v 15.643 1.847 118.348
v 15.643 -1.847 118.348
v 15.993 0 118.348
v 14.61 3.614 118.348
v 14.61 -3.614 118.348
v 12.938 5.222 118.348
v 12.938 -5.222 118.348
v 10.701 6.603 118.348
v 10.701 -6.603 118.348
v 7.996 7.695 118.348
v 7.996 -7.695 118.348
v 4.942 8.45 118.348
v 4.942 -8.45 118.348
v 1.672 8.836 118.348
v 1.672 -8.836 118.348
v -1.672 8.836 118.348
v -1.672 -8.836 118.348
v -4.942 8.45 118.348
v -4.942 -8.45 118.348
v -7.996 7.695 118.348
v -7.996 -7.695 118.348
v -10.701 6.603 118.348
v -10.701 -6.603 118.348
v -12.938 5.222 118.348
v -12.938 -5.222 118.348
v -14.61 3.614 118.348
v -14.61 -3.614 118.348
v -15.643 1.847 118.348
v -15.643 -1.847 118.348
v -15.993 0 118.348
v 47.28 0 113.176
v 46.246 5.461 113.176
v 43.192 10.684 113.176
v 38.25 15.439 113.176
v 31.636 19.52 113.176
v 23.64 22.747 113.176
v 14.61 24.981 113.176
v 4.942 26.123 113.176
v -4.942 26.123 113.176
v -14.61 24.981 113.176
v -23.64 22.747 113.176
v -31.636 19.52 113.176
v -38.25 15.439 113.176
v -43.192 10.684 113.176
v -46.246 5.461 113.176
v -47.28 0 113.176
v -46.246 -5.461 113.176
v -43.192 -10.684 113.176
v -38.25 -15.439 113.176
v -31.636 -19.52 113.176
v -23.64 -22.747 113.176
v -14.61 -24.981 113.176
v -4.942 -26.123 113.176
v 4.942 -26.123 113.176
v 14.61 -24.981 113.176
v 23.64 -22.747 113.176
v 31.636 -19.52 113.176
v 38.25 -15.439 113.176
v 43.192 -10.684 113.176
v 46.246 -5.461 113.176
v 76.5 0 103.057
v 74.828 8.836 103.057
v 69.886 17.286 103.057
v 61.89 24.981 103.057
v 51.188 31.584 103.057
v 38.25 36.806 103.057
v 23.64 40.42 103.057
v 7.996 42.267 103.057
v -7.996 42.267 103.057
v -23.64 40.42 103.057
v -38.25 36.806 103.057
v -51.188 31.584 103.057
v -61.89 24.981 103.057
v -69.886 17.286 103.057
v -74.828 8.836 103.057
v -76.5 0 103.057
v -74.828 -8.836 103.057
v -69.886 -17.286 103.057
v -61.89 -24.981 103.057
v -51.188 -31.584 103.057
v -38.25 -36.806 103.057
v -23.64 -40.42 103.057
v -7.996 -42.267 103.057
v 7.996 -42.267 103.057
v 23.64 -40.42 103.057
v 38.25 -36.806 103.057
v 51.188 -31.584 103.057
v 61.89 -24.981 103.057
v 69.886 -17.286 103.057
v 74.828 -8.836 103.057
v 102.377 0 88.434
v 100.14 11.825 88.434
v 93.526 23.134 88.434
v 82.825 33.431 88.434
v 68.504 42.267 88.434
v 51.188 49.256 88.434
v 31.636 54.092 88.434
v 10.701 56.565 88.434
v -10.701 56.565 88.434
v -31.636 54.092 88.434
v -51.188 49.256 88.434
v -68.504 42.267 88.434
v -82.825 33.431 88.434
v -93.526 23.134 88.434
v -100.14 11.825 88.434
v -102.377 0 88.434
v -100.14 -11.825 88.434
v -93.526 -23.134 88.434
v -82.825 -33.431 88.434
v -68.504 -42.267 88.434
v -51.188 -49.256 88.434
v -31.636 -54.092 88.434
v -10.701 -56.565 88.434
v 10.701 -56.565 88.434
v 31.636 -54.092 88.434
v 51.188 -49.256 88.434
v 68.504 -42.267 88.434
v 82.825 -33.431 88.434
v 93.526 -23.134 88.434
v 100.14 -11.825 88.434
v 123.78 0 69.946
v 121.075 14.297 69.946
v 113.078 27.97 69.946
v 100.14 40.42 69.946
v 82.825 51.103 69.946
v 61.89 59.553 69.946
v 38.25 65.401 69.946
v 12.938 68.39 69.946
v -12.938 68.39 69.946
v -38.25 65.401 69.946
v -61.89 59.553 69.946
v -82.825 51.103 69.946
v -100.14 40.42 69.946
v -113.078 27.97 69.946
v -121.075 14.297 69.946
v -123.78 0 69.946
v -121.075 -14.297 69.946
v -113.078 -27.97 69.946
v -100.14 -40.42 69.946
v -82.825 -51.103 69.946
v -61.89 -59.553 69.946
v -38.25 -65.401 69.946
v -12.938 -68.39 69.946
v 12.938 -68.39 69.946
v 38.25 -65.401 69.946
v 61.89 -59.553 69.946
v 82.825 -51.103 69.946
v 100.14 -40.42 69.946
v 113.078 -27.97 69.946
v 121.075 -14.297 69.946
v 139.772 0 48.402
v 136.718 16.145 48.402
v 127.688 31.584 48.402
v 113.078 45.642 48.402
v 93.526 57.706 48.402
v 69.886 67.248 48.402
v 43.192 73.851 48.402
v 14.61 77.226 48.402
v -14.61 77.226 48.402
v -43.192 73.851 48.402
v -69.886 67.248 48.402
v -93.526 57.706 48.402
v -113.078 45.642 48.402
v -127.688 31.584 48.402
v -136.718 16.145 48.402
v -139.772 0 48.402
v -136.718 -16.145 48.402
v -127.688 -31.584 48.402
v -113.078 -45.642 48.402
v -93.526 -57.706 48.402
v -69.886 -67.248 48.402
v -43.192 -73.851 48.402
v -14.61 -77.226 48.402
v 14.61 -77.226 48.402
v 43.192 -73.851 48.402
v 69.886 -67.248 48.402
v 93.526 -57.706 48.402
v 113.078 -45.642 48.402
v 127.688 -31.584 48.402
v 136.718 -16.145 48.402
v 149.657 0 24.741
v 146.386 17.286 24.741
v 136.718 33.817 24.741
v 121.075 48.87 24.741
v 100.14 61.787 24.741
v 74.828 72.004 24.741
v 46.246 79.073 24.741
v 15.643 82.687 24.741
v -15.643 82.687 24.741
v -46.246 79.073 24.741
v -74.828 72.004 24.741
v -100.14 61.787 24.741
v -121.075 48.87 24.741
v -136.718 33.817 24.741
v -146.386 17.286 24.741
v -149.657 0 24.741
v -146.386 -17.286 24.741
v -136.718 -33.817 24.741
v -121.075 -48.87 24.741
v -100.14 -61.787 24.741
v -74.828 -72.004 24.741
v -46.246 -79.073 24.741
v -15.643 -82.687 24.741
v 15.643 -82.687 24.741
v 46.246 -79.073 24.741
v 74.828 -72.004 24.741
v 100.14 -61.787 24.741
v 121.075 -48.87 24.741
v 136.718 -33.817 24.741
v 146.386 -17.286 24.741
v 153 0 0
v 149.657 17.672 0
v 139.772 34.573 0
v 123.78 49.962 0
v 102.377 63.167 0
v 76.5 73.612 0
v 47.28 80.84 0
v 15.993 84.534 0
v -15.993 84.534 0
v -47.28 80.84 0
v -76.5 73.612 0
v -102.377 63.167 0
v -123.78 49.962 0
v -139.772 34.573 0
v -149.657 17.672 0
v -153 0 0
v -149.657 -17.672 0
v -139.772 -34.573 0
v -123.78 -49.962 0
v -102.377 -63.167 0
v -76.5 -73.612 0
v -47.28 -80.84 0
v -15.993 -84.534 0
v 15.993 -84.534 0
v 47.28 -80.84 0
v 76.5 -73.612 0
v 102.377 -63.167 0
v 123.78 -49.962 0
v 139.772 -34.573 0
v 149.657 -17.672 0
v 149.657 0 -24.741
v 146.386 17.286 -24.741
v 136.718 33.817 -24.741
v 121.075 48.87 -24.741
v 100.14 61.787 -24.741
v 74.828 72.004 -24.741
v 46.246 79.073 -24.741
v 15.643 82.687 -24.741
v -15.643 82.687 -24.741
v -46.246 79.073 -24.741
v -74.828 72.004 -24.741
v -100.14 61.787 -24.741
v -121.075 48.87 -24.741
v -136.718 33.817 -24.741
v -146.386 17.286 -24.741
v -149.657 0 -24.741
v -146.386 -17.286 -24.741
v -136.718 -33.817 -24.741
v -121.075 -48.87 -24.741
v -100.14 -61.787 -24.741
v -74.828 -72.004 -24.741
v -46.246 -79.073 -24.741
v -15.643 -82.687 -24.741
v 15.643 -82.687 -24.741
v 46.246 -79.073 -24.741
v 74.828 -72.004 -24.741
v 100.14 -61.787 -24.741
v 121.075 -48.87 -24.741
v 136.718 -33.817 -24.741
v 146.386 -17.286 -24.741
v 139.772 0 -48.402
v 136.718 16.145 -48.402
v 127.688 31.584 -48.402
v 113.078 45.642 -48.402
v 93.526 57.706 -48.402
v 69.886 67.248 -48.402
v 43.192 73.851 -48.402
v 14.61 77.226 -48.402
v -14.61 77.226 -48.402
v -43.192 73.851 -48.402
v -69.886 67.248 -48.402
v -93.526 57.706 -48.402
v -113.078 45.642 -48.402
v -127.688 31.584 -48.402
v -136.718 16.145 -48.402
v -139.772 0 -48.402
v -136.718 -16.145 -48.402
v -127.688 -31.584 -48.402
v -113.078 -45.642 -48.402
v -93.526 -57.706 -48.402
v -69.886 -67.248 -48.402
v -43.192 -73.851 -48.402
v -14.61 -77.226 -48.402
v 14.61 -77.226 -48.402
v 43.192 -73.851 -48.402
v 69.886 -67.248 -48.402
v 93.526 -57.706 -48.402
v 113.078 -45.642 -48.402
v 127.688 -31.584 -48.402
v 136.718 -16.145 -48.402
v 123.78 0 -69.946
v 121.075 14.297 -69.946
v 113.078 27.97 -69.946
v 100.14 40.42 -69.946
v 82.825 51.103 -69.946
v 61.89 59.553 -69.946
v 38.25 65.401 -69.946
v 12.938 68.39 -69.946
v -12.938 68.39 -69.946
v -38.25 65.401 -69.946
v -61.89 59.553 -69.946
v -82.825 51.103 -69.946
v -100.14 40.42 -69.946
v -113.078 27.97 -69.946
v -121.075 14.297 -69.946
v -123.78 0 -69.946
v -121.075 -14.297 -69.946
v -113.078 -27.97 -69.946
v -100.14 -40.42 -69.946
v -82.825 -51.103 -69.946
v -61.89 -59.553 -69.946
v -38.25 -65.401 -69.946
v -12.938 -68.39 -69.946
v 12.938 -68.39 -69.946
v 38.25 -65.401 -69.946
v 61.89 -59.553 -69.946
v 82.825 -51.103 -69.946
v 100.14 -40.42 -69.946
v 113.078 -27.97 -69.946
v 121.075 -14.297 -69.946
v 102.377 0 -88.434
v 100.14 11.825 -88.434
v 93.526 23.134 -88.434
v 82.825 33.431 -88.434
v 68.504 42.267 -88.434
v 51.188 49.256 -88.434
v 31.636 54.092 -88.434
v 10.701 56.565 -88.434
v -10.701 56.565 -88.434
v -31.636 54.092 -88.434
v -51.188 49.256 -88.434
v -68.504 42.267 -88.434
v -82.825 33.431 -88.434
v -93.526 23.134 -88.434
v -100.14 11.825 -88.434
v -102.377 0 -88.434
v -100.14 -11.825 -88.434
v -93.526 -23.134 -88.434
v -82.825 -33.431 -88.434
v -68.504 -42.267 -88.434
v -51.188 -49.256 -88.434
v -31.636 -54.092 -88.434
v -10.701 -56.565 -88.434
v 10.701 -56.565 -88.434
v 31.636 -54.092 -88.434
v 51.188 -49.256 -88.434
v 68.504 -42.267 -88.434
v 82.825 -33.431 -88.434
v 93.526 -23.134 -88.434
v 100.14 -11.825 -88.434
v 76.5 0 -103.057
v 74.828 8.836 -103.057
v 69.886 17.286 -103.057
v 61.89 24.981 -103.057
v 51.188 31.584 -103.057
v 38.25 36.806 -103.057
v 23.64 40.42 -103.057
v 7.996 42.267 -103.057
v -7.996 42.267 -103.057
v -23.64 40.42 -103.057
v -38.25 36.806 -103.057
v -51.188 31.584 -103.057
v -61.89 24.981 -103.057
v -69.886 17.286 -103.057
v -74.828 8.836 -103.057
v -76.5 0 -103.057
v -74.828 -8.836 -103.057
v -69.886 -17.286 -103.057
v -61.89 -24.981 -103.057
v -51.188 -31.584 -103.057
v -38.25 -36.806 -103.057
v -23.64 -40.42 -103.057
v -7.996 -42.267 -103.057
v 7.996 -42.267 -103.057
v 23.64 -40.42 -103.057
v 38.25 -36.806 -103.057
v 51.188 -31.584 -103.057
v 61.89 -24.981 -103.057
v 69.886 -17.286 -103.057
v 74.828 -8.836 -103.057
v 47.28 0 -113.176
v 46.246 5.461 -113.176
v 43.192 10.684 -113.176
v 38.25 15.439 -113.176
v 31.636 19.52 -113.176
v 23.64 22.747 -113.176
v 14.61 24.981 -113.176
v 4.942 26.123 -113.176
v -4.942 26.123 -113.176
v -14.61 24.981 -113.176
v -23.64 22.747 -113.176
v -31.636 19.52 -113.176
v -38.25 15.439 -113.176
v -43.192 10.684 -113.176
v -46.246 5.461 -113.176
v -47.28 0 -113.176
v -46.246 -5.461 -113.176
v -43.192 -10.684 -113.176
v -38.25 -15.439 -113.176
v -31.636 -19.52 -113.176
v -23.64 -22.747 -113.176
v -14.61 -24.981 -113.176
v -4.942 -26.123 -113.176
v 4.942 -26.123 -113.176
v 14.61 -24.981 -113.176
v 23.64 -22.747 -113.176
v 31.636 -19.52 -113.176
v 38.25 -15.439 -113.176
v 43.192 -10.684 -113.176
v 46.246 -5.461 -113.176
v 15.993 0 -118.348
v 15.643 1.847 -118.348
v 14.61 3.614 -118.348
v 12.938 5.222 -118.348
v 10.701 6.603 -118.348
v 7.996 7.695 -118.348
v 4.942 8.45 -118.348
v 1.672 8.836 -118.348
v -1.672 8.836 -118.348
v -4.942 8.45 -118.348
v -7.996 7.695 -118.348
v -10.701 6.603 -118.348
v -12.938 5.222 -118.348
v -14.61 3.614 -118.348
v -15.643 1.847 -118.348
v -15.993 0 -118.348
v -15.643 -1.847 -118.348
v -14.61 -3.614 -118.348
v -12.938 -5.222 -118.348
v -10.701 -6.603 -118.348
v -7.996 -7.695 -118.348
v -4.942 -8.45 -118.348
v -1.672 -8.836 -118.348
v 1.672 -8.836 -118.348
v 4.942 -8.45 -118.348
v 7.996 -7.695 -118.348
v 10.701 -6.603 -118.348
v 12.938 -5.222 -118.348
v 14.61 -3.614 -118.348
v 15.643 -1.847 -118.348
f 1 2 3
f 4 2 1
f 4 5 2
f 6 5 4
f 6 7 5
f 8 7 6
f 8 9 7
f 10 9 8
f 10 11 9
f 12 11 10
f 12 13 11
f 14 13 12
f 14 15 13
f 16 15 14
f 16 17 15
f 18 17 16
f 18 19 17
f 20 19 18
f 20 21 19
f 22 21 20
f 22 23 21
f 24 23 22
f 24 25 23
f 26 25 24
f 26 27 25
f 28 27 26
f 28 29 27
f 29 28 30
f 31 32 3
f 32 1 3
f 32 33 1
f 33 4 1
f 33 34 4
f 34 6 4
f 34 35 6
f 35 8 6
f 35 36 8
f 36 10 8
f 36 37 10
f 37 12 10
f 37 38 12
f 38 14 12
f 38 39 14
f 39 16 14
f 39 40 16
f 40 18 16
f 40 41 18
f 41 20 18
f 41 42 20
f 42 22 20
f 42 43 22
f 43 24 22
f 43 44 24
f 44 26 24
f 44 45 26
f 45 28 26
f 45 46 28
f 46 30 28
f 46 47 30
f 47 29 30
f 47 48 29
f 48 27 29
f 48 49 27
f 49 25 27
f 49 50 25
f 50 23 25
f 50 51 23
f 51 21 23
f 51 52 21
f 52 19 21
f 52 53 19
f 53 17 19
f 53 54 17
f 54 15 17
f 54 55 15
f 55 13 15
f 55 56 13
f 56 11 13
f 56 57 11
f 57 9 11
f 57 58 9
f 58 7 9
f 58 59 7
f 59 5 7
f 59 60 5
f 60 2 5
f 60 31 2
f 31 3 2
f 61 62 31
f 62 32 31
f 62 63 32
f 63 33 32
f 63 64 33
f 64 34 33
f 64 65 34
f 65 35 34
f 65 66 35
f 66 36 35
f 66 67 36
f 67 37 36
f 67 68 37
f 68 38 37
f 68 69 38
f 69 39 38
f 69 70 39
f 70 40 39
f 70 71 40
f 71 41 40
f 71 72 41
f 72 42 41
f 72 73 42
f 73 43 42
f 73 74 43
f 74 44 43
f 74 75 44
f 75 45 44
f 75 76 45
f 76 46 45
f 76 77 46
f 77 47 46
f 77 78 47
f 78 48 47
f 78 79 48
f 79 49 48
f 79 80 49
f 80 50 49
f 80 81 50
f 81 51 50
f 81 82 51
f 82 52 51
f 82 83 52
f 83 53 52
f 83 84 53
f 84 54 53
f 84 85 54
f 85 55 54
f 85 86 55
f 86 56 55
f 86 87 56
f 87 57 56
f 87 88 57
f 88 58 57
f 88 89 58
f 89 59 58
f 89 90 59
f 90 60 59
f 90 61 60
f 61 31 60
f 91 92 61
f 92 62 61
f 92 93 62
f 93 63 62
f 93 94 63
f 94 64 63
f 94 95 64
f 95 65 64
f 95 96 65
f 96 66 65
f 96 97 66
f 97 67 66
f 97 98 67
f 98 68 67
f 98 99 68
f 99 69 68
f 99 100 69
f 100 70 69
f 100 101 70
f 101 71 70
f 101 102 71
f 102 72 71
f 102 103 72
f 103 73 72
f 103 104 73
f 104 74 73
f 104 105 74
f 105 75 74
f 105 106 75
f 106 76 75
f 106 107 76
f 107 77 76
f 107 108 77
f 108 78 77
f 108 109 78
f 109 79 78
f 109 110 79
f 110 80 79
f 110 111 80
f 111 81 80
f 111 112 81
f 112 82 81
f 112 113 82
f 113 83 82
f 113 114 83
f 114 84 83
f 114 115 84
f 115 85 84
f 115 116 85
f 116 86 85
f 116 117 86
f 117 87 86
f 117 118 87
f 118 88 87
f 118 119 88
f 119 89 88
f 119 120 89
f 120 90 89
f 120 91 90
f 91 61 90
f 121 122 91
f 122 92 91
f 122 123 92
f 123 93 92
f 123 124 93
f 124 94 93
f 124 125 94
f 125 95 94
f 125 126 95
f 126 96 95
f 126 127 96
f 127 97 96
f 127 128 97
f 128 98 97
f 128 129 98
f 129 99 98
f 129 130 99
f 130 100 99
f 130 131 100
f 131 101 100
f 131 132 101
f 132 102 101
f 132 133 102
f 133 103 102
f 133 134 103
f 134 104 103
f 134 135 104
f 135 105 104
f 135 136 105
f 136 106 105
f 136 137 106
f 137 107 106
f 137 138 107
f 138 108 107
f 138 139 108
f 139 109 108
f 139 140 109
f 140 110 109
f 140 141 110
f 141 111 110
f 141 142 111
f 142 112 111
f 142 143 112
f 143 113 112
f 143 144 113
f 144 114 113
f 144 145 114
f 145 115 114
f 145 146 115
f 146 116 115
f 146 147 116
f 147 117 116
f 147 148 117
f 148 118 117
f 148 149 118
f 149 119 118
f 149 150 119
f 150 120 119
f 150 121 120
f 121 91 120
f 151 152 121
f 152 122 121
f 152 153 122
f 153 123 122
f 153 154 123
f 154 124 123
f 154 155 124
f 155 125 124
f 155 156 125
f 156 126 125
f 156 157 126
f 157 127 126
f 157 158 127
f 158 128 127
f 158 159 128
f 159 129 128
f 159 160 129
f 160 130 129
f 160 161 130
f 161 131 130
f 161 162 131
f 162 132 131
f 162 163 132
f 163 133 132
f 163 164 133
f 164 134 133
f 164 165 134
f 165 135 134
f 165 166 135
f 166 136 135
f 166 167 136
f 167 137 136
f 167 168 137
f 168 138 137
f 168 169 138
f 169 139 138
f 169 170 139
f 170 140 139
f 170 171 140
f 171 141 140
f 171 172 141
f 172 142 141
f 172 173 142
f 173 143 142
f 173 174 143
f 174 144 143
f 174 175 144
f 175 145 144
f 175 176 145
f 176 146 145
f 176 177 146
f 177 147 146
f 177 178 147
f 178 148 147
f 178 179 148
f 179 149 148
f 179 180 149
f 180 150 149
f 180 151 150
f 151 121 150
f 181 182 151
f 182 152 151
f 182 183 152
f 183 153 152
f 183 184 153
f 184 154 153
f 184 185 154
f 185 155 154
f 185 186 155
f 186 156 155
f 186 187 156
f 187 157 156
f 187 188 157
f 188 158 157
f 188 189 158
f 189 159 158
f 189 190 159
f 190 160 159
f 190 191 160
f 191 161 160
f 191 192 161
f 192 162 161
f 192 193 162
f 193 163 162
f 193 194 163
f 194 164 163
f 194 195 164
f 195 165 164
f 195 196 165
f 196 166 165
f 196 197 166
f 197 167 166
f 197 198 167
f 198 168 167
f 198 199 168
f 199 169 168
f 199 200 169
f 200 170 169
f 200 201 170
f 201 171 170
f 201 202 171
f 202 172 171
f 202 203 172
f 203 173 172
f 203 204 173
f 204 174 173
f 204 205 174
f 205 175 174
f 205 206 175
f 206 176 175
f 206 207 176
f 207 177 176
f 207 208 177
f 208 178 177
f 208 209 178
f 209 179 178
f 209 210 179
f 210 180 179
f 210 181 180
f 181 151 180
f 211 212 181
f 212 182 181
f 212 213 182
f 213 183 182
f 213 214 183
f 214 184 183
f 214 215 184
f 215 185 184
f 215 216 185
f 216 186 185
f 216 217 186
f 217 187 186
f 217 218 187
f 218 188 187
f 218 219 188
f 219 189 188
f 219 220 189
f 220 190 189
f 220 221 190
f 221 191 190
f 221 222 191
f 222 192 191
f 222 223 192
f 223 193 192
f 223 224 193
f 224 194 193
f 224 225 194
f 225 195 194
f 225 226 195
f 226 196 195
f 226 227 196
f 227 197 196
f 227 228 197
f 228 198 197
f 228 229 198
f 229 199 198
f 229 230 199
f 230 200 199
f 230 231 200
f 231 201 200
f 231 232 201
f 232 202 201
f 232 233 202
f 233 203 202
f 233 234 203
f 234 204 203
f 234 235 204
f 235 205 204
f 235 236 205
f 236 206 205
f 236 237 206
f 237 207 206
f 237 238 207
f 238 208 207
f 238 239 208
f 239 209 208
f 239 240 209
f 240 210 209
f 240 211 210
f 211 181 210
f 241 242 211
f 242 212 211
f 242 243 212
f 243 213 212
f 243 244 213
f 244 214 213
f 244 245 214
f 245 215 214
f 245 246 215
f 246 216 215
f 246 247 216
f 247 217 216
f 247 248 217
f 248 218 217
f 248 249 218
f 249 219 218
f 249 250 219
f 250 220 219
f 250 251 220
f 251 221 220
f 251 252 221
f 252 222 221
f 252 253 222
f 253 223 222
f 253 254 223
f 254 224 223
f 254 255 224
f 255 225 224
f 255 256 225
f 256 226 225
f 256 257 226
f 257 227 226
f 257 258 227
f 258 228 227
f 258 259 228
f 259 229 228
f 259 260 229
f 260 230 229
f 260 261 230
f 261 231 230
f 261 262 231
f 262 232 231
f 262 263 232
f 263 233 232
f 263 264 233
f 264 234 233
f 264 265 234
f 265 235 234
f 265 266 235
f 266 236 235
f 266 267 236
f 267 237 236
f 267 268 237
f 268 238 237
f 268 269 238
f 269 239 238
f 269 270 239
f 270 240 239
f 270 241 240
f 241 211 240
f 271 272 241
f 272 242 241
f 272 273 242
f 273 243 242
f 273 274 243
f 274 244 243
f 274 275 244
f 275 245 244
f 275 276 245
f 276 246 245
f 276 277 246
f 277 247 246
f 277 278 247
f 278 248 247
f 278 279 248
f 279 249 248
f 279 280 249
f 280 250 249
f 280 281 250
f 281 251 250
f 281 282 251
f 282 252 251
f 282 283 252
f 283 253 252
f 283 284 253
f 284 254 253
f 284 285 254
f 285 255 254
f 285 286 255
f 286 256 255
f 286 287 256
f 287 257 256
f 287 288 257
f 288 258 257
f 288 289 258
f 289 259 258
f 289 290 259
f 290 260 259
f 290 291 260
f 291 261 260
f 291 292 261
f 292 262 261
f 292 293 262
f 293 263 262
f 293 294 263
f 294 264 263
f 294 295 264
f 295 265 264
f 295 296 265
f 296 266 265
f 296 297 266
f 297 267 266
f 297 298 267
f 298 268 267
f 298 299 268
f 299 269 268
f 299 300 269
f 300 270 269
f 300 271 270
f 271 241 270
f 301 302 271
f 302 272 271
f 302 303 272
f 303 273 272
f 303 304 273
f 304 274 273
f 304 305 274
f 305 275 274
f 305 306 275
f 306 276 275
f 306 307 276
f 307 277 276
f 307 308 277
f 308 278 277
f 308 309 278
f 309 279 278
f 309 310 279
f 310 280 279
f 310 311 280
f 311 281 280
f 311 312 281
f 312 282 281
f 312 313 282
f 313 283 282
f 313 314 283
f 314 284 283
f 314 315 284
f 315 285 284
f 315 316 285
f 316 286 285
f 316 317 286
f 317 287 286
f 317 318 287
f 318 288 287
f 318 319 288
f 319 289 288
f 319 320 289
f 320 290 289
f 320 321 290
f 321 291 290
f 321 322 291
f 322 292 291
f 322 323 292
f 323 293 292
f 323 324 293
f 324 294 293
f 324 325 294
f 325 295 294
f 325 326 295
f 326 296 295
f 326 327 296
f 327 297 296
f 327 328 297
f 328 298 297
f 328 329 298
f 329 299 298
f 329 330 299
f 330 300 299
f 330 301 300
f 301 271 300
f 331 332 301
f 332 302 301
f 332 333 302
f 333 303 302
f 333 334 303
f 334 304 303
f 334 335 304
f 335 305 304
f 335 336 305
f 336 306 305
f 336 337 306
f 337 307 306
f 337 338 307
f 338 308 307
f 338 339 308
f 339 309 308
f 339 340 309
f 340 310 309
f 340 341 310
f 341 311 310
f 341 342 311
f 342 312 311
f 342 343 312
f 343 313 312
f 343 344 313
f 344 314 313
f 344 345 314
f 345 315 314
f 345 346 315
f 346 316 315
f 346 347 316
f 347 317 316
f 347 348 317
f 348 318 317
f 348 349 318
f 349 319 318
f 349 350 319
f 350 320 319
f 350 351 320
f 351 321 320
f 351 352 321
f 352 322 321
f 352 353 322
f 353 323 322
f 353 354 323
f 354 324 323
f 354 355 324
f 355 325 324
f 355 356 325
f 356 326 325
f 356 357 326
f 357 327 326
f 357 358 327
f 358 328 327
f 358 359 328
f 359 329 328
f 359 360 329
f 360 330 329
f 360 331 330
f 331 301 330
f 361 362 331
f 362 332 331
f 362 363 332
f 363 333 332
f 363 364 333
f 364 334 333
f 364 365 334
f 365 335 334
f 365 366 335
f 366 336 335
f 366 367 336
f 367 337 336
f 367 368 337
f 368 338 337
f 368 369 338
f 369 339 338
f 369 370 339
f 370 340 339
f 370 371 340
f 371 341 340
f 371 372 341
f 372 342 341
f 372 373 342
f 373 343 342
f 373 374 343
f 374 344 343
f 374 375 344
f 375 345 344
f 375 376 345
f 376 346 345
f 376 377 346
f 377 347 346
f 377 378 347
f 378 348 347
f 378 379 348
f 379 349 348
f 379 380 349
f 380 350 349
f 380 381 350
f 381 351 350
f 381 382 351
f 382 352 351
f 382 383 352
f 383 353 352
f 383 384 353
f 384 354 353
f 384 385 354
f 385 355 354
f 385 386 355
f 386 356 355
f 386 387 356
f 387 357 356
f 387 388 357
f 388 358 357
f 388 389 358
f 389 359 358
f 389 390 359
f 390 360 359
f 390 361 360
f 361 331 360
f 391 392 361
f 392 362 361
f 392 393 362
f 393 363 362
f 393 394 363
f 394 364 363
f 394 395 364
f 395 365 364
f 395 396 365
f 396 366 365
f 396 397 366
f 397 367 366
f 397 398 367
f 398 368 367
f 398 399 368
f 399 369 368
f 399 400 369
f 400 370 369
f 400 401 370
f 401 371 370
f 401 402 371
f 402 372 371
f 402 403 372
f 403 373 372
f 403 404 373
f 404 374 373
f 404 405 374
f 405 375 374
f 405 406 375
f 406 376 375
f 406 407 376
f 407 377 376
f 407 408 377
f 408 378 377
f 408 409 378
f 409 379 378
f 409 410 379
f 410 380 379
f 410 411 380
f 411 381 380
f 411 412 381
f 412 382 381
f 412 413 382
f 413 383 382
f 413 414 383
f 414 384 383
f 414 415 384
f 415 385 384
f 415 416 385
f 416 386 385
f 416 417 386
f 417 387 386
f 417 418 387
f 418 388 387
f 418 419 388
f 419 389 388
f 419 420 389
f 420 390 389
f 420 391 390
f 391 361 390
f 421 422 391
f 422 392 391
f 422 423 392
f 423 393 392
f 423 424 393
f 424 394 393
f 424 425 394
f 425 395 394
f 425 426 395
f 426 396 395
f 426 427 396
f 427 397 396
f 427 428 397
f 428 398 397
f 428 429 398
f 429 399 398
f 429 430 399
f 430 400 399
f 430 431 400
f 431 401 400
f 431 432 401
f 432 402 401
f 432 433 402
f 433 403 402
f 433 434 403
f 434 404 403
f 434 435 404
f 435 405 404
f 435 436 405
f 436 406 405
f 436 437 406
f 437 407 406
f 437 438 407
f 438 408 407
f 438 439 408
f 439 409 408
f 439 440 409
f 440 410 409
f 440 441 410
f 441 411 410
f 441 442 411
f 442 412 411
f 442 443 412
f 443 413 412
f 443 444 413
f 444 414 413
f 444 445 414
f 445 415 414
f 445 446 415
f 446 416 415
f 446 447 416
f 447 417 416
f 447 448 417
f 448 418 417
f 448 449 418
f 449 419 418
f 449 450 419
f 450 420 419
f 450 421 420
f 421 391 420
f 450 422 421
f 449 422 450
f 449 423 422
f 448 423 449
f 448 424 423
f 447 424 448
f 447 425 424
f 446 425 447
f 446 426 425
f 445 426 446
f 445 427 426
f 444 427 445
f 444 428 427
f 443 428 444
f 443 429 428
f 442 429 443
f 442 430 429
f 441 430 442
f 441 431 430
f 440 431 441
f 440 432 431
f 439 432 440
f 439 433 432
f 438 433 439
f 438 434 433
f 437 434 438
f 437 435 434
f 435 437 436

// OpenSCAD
// Generated by SolidPython 1.0.1 on 2020-07-29 00:46:48


scale(v = [9, 5, 7]) {
	sphere(r = 17);
}
/***********************************************
*********      SolidPython code:      **********
************************************************
 
# import packages: SolidPython
from solid import *
from solid.utils import *
from itertools import chain, combinations, permutations


class Resize:

    def __init__(self, scad_file):
        self.scad_file = scad_file
        #self.scad_file = import_scad(scad_file)
        # cone/cylinder param:
        self.r1 = 0
        self.r2 = 0
        self.h = 0
        # rectangular prism param:
        self.w = 0
        self.l = 0
        # ellipse param:
        self.r = 0

    # import OpenScad code (file name corresponds to shape)


    # classify shape + parameters
    def assign(self, param1, param2, param3):
        if self.scad_file == 'cone.scad':
            self.r1 = param1
            self.r2 = param2
            self.h = param3
        elif self.scad_file == 'cylinder.scad':
            self.r1 = param1
            self.r2 = param2
            self.h = param3
        elif self.scad_file == 'rectangularPrism.scad':
            self.h = param1
            self.l = param2
            self.w = param3
        else:
            self.r = param1
            self.h = param2

    # resize parameters
    def iterate(self):
        x = range(3, 20, 2)
        i = 1
        if self.scad_file == 'cone.scad':
            tempList = list(permutations(x, 2))
            for temp in tempList:
                param1 = temp[0]
                param2 = temp[1]
                filepath = 'produced_scad_files/' + 'cone' + str(param1) + '_' + str(param2) + '_' + '.scad'
                scad_render_to_file(cylinder(h=param1, r1=param2, r2=0), filepath)

        elif self.scad_file == 'cylinder.scad':
            tempList = list(permutations(x, 3))
            for temp in tempList:
                param1 = temp[0]
                param2 = temp[1]
                filepath = 'produced_scad_files/' + 'cylinder' + str(param1) + '_' + str(param2) + '_' + '.scad'
                scad_render_to_file(cylinder(h=param1, r1=param2, r2=param2), filepath)

        elif self.scad_file == 'rectangularPrism.scad':
            tempList = list(permutations(x, 3))
            for temp in tempList:
                param1 = temp[0]
                param2 = temp[1]
                param3 = temp[2]
                filepath = 'produced_scad_files/' + 'rectangularPrism' + str(param1) + '_' + str(param2) + '_' + str(
                    param3) + '.scad'
                scad_render_to_file(cube(size=(param1, param2, param3)), filepath)

        elif self.scad_file == 'ellipse.scad':
            tempList = list(permutations(x, 4))
            for temp in tempList:
                param1 = temp[0]
                param2 = temp[1]
                param3 = temp[2]
                param4 = temp[3]
                filepath = 'produced_scad_files/' + 'ellipse' + str(param1) + '_' + str(param2) + '_' + str(param3) + '_' + str(param4) + '.scad'
                scad_render_to_file(scale([param1, param2, param3])(sphere(r=param4)), filepath)

    def render_to_scadfile(self):
        scad_render_to_file(scad, 'example.scad') 
 
************************************************/
